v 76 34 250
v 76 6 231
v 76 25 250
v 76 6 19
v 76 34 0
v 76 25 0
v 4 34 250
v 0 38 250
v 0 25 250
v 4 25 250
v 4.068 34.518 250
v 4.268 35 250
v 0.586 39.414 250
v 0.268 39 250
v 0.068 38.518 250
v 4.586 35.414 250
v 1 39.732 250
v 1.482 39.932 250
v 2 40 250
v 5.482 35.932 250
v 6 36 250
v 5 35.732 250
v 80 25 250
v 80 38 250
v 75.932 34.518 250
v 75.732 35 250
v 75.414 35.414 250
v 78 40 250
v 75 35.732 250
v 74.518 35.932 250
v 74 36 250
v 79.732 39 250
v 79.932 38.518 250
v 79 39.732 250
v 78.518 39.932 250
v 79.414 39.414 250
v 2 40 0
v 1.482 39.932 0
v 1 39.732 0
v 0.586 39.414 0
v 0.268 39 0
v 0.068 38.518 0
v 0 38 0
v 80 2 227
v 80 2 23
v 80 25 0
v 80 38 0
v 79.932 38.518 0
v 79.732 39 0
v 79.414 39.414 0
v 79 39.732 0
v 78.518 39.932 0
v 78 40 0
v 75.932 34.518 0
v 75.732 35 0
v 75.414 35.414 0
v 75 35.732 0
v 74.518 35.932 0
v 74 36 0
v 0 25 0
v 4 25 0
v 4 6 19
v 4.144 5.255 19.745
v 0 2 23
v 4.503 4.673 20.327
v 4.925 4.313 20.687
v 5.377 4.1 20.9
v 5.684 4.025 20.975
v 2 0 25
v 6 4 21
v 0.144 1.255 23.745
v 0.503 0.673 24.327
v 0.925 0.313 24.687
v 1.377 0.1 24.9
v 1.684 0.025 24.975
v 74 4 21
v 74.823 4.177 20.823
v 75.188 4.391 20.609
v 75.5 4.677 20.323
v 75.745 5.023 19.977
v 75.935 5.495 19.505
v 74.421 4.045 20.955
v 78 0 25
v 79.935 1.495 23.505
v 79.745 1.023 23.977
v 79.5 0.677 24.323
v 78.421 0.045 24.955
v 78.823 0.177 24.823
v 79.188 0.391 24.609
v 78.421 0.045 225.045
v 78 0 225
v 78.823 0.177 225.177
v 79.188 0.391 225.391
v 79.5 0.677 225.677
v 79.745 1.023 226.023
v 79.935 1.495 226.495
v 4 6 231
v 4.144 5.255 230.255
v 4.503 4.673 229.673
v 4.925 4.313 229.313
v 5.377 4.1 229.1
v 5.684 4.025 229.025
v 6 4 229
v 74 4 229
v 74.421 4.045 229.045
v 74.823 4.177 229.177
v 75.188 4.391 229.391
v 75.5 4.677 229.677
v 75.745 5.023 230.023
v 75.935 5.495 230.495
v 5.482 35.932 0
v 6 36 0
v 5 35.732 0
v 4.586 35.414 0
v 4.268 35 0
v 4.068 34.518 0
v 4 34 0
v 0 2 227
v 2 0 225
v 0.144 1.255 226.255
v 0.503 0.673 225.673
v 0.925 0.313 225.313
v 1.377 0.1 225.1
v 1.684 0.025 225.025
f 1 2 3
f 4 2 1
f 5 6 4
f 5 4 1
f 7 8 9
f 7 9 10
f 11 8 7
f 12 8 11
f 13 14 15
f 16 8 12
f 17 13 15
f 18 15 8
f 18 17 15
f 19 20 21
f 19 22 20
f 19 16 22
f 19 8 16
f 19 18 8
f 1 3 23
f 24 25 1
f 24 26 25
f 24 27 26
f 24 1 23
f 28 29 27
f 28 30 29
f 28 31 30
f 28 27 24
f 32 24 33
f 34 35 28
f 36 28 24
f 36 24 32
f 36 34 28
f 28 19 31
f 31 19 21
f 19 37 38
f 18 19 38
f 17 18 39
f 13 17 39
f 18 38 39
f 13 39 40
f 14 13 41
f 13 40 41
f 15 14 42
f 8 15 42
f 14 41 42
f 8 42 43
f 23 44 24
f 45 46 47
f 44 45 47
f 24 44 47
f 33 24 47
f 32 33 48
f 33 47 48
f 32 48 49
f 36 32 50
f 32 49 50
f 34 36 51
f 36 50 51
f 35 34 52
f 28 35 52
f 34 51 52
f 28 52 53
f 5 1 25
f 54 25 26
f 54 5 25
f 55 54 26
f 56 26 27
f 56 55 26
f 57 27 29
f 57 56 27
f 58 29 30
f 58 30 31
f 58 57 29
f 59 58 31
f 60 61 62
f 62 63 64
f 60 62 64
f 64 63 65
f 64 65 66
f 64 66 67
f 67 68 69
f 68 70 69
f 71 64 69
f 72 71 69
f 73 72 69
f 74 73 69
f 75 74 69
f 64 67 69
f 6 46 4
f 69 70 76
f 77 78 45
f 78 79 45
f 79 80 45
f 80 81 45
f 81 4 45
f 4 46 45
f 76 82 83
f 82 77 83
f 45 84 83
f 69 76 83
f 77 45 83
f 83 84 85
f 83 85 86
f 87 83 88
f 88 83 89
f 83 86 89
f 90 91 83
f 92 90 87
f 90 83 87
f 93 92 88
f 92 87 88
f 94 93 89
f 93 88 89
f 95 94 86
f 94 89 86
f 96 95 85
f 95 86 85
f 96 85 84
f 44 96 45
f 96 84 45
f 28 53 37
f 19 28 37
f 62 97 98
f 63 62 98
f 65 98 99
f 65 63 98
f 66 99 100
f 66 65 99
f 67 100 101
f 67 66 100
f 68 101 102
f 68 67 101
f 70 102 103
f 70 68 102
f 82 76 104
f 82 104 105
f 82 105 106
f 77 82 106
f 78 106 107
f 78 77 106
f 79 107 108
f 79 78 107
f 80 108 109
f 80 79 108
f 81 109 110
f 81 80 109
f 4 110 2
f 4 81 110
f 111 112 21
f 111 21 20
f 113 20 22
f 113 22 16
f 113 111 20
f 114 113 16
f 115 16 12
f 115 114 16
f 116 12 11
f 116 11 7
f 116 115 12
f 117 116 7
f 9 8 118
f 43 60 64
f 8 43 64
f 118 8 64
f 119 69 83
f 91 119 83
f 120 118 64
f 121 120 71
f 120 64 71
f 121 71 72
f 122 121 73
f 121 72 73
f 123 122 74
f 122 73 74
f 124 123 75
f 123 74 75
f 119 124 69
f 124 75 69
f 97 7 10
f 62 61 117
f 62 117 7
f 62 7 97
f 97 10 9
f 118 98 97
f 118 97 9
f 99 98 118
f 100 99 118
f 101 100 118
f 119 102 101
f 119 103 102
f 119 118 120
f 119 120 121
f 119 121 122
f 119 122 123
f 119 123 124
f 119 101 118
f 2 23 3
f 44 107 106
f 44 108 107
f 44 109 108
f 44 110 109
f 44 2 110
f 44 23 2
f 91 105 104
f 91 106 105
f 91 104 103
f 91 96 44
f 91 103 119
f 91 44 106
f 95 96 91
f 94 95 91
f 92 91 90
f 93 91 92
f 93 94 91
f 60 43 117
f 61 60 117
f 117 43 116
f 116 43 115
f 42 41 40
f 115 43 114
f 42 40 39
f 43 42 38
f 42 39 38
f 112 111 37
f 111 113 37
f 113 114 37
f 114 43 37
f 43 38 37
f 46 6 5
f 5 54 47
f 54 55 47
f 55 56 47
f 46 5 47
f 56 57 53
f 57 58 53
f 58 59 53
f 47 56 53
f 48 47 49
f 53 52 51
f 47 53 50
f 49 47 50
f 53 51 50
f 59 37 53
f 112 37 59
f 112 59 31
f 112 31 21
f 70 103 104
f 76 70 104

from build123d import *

# Parameters (mm, degrees)
BOSS_EXTRU_1_DEPTH      = 250
ENL_V_MAT_EXTRU_1_DEPTH = 266.518360947


with BuildPart() as part:
    # Esquisse2 → Boss.-Extru.1 (new body)
    with BuildSketch(Plane.XY):
        with BuildLine():
            Line((2, 0), (78, 0))
            ThreePointArc((78, 0), (79.414213562, 0.585786438), (80, 2))
            Line((80, 2), (80, 38))
            ThreePointArc((80, 38), (79.414213562, 39.414213562), (78, 40))
            Line((78, 40), (2, 40))
            ThreePointArc((2, 40), (0.585786438, 39.414213562), (0, 38))
            Line((0, 38), (0, 2))
            ThreePointArc((0, 2), (0.585786438, 0.585786438), (2, 0))
        make_face()
        with BuildLine():
            Line((6, 4), (74, 4))
            ThreePointArc((74, 4), (75.414213562, 4.585786438), (76, 6))
            Line((76, 6), (76, 34))
            ThreePointArc((76, 34), (75.414213562, 35.414213562), (74, 36))
            Line((74, 36), (6, 36))
            ThreePointArc((6, 36), (4.585786438, 35.414213562), (4, 34))
            Line((4, 34), (4, 6))
            ThreePointArc((4, 6), (4.585786438, 4.585786438), (6, 4))
        make_face(mode=Mode.SUBTRACT)
    extrude(amount=BOSS_EXTRU_1_DEPTH)

    # Esquisse3 → Enlèv. mat.-Extru.1 (cut, through all)
    with BuildSketch(Plane(origin=(80, 0, 0), x_dir=(0, 0, -1), z_dir=(1, 0, 0))):
        Polygon((0, 25), (-25, 0), (0, 0), align=None)
        Polygon((-250, 25), (-225, 0), (-250, 0), align=None)
    extrude(amount=-ENL_V_MAT_EXTRU_1_DEPTH, mode=Mode.SUBTRACT)


solid = part.part
